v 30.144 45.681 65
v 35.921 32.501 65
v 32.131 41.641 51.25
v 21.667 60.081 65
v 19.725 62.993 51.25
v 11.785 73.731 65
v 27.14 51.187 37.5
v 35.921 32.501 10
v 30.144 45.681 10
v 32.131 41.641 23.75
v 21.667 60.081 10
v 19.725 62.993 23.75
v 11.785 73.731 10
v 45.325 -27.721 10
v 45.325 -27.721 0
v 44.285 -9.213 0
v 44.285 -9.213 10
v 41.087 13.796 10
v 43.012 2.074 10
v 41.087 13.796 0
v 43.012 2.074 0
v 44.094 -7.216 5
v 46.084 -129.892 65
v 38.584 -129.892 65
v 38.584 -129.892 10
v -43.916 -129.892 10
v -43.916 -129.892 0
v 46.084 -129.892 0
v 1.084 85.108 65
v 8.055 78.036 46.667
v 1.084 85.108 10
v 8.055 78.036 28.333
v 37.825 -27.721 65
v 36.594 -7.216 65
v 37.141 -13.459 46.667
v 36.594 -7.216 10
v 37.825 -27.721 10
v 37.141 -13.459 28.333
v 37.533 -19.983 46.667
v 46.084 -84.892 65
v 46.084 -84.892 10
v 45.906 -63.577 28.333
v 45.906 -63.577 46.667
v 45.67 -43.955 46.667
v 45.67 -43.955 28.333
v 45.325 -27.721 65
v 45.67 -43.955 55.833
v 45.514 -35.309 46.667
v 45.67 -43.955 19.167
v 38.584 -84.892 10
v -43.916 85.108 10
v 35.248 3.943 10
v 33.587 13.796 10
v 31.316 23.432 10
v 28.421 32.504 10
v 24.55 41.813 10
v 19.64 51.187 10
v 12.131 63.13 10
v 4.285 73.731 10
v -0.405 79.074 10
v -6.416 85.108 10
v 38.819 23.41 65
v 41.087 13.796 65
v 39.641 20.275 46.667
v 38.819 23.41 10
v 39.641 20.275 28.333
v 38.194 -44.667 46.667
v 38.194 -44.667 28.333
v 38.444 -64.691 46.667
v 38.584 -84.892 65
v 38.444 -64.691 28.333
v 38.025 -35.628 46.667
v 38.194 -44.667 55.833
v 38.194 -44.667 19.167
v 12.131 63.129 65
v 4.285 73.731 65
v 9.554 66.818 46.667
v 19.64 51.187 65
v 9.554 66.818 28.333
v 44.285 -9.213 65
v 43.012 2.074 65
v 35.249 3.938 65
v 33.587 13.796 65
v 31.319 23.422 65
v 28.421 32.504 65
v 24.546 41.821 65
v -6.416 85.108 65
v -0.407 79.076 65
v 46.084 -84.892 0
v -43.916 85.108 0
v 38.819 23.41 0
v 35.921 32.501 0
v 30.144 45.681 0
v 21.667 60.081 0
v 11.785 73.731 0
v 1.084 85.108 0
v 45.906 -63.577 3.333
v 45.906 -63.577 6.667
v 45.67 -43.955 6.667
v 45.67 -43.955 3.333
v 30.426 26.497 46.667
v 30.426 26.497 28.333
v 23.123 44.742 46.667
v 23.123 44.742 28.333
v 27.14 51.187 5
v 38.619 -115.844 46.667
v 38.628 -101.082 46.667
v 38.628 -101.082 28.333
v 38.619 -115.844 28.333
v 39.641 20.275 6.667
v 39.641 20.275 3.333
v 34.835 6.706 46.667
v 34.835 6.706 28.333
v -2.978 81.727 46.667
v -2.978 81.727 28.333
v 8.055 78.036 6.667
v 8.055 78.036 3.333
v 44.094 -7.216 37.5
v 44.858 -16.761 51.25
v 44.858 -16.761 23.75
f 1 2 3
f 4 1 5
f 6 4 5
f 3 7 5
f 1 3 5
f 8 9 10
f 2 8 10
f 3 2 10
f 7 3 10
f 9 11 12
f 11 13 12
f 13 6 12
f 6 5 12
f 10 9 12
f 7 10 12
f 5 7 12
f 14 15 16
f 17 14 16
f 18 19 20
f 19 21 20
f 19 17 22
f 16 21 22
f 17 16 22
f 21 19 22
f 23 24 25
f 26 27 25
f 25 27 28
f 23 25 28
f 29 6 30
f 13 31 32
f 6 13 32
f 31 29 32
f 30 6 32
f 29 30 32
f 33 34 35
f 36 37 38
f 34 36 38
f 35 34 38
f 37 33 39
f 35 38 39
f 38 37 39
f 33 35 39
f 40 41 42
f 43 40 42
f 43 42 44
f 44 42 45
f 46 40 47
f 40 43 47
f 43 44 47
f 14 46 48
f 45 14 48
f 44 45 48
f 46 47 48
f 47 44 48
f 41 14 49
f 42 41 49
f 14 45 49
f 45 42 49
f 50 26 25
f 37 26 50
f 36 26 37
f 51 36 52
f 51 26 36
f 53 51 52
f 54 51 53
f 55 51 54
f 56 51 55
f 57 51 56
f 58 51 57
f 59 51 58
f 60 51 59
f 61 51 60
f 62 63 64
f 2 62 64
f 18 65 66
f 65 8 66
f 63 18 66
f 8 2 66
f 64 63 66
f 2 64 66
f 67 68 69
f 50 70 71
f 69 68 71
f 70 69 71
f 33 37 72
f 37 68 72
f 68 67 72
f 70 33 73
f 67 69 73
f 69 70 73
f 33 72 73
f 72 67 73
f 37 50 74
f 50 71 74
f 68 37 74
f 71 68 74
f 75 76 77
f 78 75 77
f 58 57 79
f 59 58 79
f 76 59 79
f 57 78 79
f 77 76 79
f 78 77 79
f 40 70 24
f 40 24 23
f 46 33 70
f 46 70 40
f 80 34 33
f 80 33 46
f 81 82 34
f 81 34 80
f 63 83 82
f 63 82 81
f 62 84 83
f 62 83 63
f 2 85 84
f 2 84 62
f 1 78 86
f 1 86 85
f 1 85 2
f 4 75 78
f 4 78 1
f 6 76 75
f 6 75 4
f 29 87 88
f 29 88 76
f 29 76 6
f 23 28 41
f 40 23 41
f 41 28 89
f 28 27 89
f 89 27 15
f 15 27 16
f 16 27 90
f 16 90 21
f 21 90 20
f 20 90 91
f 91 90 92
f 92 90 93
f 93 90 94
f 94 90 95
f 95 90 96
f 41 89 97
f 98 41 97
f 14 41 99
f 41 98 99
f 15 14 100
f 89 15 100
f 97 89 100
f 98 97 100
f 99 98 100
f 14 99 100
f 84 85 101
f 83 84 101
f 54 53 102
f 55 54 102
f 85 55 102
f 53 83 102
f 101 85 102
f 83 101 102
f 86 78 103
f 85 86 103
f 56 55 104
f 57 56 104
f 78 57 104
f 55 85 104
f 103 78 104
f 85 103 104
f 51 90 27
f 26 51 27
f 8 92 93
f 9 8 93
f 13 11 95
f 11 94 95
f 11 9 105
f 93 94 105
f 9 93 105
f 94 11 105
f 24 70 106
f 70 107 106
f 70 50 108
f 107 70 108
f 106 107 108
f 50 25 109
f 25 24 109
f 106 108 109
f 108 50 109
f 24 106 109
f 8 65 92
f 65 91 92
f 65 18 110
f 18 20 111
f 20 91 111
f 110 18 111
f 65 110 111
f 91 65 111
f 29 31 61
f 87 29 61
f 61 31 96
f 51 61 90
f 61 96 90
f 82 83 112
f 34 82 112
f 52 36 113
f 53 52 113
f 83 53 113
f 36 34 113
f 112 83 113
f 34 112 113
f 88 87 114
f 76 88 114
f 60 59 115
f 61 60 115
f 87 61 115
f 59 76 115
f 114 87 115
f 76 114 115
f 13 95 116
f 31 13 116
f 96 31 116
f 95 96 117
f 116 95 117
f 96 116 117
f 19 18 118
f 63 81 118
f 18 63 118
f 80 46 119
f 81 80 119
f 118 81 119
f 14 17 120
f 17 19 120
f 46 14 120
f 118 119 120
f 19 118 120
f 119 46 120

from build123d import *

# Parameters (mm, degrees)
F1_DEPTH = 10
F2_DEPTH = 10
F3_DEPTH = 65


with BuildPart() as f1:
    # F0 (on Top) → F1 (new body)
    with BuildSketch(Plane.XY):
        with BuildLine():
            Line((-6.4156497025, 85.1081629097), (-43.9156497025, 85.1081629097))
            Line((-43.9156497025, 85.1081629097), (-43.9156497025, -129.8918370903))
            Line((-43.9156497025, -129.8918370903), (38.5843502975, -129.8918370903))
            add(Edge.make_bspline(
                [(38.5843502975, -84.8918370903), (38.6629251975, -102.0344655935), (38.6236377475, -115.9631513419), (38.5843502975, -129.8918370903)],
                knots=[0.8384847001, 0.8384847001, 0.8384847001, 0.8384847001, 1, 1, 1, 1], degree=3))
            add(Edge.make_bspline(
                [(37.8247797489, -27.7212038636), (38.2574592427, -42.1620939878), (38.4957809909, -65.568736192), (38.5843502975, -84.8918370903)],
                knots=[0.656425313, 0.656425313, 0.656425313, 0.656425313, 0.8384847001, 0.8384847001, 0.8384847001, 0.8384847001], degree=3))
            add(Edge.make_bspline(
                [(36.5943424404, -7.2156004608), (37.2362484349, -13.6305807929), (37.5654292116, -19.0652525968), (37.8247797489, -27.7212038636)],
                knots=[0.5472978861, 0.5472978861, 0.5472978861, 0.5472978861, 0.656425313, 0.656425313, 0.656425313, 0.656425313], degree=3))
            add(Edge.make_bspline(
                [(33.5867255926, 13.7964012101), (34.9662089288, 6.8390445181), (35.9418422096, -0.6947450977), (36.5943424404, -7.2156004608)],
                knots=[0.4363693828, 0.4363693828, 0.4363693828, 0.4363693828, 0.5472978861, 0.5472978861, 0.5472978861, 0.5472978861], degree=3))
            add(Edge.make_bspline(
                [(28.4207668155, 32.5041674078), (30.5793144703, 26.5747507113), (32.2676481423, 20.4491037734), (33.5867255926, 13.7964012101)],
                knots=[0.3302983028, 0.3302983028, 0.3302983028, 0.3302983028, 0.4363693828, 0.4363693828, 0.4363693828, 0.4363693828], degree=3))
            add(Edge.make_bspline(
                [(19.6397788823, 51.1871948838), (23.4681991426, 44.5259897561), (26.1945597605, 38.6194409127), (28.4207668155, 32.5041674078)],
                knots=[0.2209024383, 0.2209024383, 0.2209024383, 0.2209024383, 0.3302983028, 0.3302983028, 0.3302983028, 0.3302983028], degree=3))
            add(Edge.make_bspline(
                [(4.2853341438, 73.7309530377), (9.3823617053, 67.4979864081), (15.2391329379, 58.8440359139), (19.6397788823, 51.1871948838)],
                knots=[0.0951554109, 0.0951554109, 0.0951554109, 0.0951554109, 0.2209024383, 0.2209024383, 0.2209024383, 0.2209024383], degree=3))
            add(Edge.make_bspline(
                [(-6.4156497025, 85.1081629097), (-2.9936715674, 81.7778662113), (0.4283065678, 78.4475695129), (4.2853341438, 73.7309530377)],
                knots=[0, 0, 0, 0, 0.0951554109, 0.0951554109, 0.0951554109, 0.0951554109], degree=3))
        make_face()
    extrude(amount=F1_DEPTH)

    # F0 (on Top) → F2 (join)
    with BuildSketch(Plane.XY):
        with BuildLine():
            Line((-6.4156497025, 85.1081629097), (-43.9156497025, 85.1081629097))
            Line((-43.9156497025, 85.1081629097), (-43.9156497025, -129.8918370903))
            Line((-43.9156497025, -129.8918370903), (38.5843502975, -129.8918370903))
            add(Edge.make_bspline(
                [(38.5843502975, -84.8918370903), (38.6629251975, -102.0344655935), (38.6236377475, -115.9631513419), (38.5843502975, -129.8918370903)],
                knots=[0.8384847001, 0.8384847001, 0.8384847001, 0.8384847001, 1, 1, 1, 1], degree=3))
            add(Edge.make_bspline(
                [(37.8247797489, -27.7212038636), (38.2574592427, -42.1620939878), (38.4957809909, -65.568736192), (38.5843502975, -84.8918370903)],
                knots=[0.656425313, 0.656425313, 0.656425313, 0.656425313, 0.8384847001, 0.8384847001, 0.8384847001, 0.8384847001], degree=3))
            add(Edge.make_bspline(
                [(36.5943424404, -7.2156004608), (37.2362484349, -13.6305807929), (37.5654292116, -19.0652525968), (37.8247797489, -27.7212038636)],
                knots=[0.5472978861, 0.5472978861, 0.5472978861, 0.5472978861, 0.656425313, 0.656425313, 0.656425313, 0.656425313], degree=3))
            add(Edge.make_bspline(
                [(33.5867255926, 13.7964012101), (34.9662089288, 6.8390445181), (35.9418422096, -0.6947450977), (36.5943424404, -7.2156004608)],
                knots=[0.4363693828, 0.4363693828, 0.4363693828, 0.4363693828, 0.5472978861, 0.5472978861, 0.5472978861, 0.5472978861], degree=3))
            add(Edge.make_bspline(
                [(28.4207668155, 32.5041674078), (30.5793144703, 26.5747507113), (32.2676481423, 20.4491037734), (33.5867255926, 13.7964012101)],
                knots=[0.3302983028, 0.3302983028, 0.3302983028, 0.3302983028, 0.4363693828, 0.4363693828, 0.4363693828, 0.4363693828], degree=3))
            add(Edge.make_bspline(
                [(19.6397788823, 51.1871948838), (23.4681991426, 44.5259897561), (26.1945597605, 38.6194409127), (28.4207668155, 32.5041674078)],
                knots=[0.2209024383, 0.2209024383, 0.2209024383, 0.2209024383, 0.3302983028, 0.3302983028, 0.3302983028, 0.3302983028], degree=3))
            add(Edge.make_bspline(
                [(4.2853341438, 73.7309530377), (9.3823617053, 67.4979864081), (15.2391329379, 58.8440359139), (19.6397788823, 51.1871948838)],
                knots=[0.0951554109, 0.0951554109, 0.0951554109, 0.0951554109, 0.2209024383, 0.2209024383, 0.2209024383, 0.2209024383], degree=3))
            add(Edge.make_bspline(
                [(-6.4156497025, 85.1081629097), (-2.9936715674, 81.7778662113), (0.4283065678, 78.4475695129), (4.2853341438, 73.7309530377)],
                knots=[0, 0, 0, 0, 0.0951554109, 0.0951554109, 0.0951554109, 0.0951554109], degree=3))
        make_face()
        with BuildLine():
            Line((1.0843502975, 85.1081629097), (-6.4156497025, 85.1081629097))
            add(Edge.make_bspline(
                [(-6.4156497025, 85.1081629097), (-2.9936715674, 81.7778662113), (0.4283065678, 78.4475695129), (4.2853341438, 73.7309530377)],
                knots=[0, 0, 0, 0, 0.0951554109, 0.0951554109, 0.0951554109, 0.0951554109], degree=3))
            Line((4.2853341438, 73.7309530377), (11.7853341438, 73.7309530377))
            add(Edge.make_bspline(
                [(11.7853341438, 73.7309530377), (7.9263211871, 78.4469803122), (4.4998545709, 81.7753394458), (1.0843502975, 85.1081629097)],
                knots=[0.8865149152, 0.8865149152, 0.8865149152, 0.8865149152, 1, 1, 1, 1], degree=3))
        make_face()
        with BuildLine():
            Line((11.7853341438, 73.7309530377), (4.2853341438, 73.7309530377))
            add(Edge.make_bspline(
                [(4.2853341438, 73.7309530377), (9.3823617053, 67.4979864081), (15.2391329379, 58.8440359139), (19.6397788823, 51.1871948838)],
                knots=[0.0951554109, 0.0951554109, 0.0951554109, 0.0951554109, 0.2209024383, 0.2209024383, 0.2209024383, 0.2209024383], degree=3))
            Line((19.6397788823, 51.1871948838), (27.1397788823, 51.1871948838))
            add(Edge.make_bspline(
                [(27.1397788823, 51.1871948838), (22.7400090025, 58.8432384602), (16.8849853681, 67.4987650316), (11.7853341438, 73.7309530377)],
                knots=[0.7365453872, 0.7365453872, 0.7365453872, 0.7365453872, 0.8865149152, 0.8865149152, 0.8865149152, 0.8865149152], degree=3))
        make_face()
        with BuildLine():
            Line((27.1397788823, 51.1871948838), (19.6397788823, 51.1871948838))
            add(Edge.make_bspline(
                [(19.6397788823, 51.1871948838), (23.4681991426, 44.5259897561), (26.1945597605, 38.6194409127), (28.4207668155, 32.5041674078)],
                knots=[0.2209024383, 0.2209024383, 0.2209024383, 0.2209024383, 0.3302983028, 0.3302983028, 0.3302983028, 0.3302983028], degree=3))
            Line((28.4207668155, 32.5041674078), (35.9207659553, 32.5005751986))
            add(Edge.make_bspline(
                [(35.9207659553, 32.5005751986), (33.6941243555, 38.6216951614), (30.9677383505, 44.5261591256), (27.1397788823, 51.1871948838)],
                knots=[0.6060664552, 0.6060664552, 0.6060664552, 0.6060664552, 0.7365453872, 0.7365453872, 0.7365453872, 0.7365453872], degree=3))
        make_face()
        with BuildLine():
            Line((35.9207659553, 32.5005751986), (28.4207668155, 32.5041674078))
            add(Edge.make_bspline(
                [(28.4207668155, 32.5041674078), (30.5793144703, 26.5747507113), (32.2676481423, 20.4491037734), (33.5867255926, 13.7964012101)],
                knots=[0.3302983028, 0.3302983028, 0.3302983028, 0.3302983028, 0.4363693828, 0.4363693828, 0.4363693828, 0.4363693828], degree=3))
            Line((33.5867255926, 13.7964012101), (41.0867255926, 13.7964012101))
            add(Edge.make_bspline(
                [(41.0867255926, 13.7964012101), (39.7683073236, 20.4287791205), (38.0793724104, 26.5664863603), (35.9207659553, 32.5005751986)],
                knots=[0.4795743136, 0.4795743136, 0.4795743136, 0.4795743136, 0.6060664552, 0.6060664552, 0.6060664552, 0.6060664552], degree=3))
        make_face()
        with BuildLine():
            Line((41.0867255926, 13.7964012101), (33.5867255926, 13.7964012101))
            add(Edge.make_bspline(
                [(33.5867255926, 13.7964012101), (34.9662089288, 6.8390445181), (35.9418422096, -0.6947450977), (36.5943424404, -7.2156004608)],
                knots=[0.4363693828, 0.4363693828, 0.4363693828, 0.4363693828, 0.5472978861, 0.5472978861, 0.5472978861, 0.5472978861], degree=3))
            Line((36.5943424404, -7.2156004608), (44.0943424404, -7.2156004608))
            add(Edge.make_bspline(
                [(44.0943424404, -7.2156004608), (43.4392586722, -0.6181494471), (42.4656425654, 6.8596811378), (41.0867255926, 13.7964012101)],
                knots=[0.3472777843, 0.3472777843, 0.3472777843, 0.3472777843, 0.4795743136, 0.4795743136, 0.4795743136, 0.4795743136], degree=3))
        make_face()
        with BuildLine():
            add(Edge.make_bspline(
                [(36.5943424404, -7.2156004608), (37.2362484349, -13.6305807929), (37.5654292116, -19.0652525968), (37.8247797489, -27.7212038636)],
                knots=[0.5472978861, 0.5472978861, 0.5472978861, 0.5472978861, 0.656425313, 0.656425313, 0.656425313, 0.656425313], degree=3))
            Line((37.8247797489, -27.7212038636), (45.3247797489, -27.7212038636))
            add(Edge.make_bspline(
                [(45.3247797489, -27.7212038636), (45.0749649187, -19.3442418385), (44.7387900251, -13.7059328081), (44.0943424404, -7.2156004608)],
                knots=[0.2171292707, 0.2171292707, 0.2171292707, 0.2171292707, 0.3472777843, 0.3472777843, 0.3472777843, 0.3472777843], degree=3))
            Line((44.0943424404, -7.2156004608), (36.5943424404, -7.2156004608))
        make_face()
        with BuildLine():
            add(Edge.make_bspline(
                [(37.8247797489, -27.7212038636), (38.2574592427, -42.1620939878), (38.4957809909, -65.568736192), (38.5843502975, -84.8918370903)],
                knots=[0.656425313, 0.656425313, 0.656425313, 0.656425313, 0.8384847001, 0.8384847001, 0.8384847001, 0.8384847001], degree=3))
            Line((38.5843502975, -84.8918370903), (46.0843502975, -84.8918370903))
            add(Edge.make_bspline(
                [(46.0843502975, -84.8918370903), (45.9179565044, -63.2945609487), (45.7415506391, -41.6966508653), (45.3247797489, -27.7212038636)],
                knots=[0, 0, 0, 0, 0.2171292707, 0.2171292707, 0.2171292707, 0.2171292707], degree=3))
            Line((45.3247797489, -27.7212038636), (37.8247797489, -27.7212038636))
        make_face()
    extrude(amount=F2_DEPTH)

    # F0 (on Top) → F3 (join)
    with BuildSketch(Plane.XY):
        with BuildLine():
            add(Edge.make_bspline(
                [(38.5843502975, -84.8918370903), (38.6629251975, -102.0344655935), (38.6236377475, -115.9631513419), (38.5843502975, -129.8918370903)],
                knots=[0.8384847001, 0.8384847001, 0.8384847001, 0.8384847001, 1, 1, 1, 1], degree=3))
            Line((38.5843502975, -129.8918370903), (46.0843502975, -129.8918370903))
            Line((46.0843502975, -129.8918370903), (46.0843502975, -84.8918370903))
            Line((46.0843502975, -84.8918370903), (38.5843502975, -84.8918370903))
        make_face()
        with BuildLine():
            add(Edge.make_bspline(
                [(37.8247797489, -27.7212038636), (38.2574592427, -42.1620939878), (38.4957809909, -65.568736192), (38.5843502975, -84.8918370903)],
                knots=[0.656425313, 0.656425313, 0.656425313, 0.656425313, 0.8384847001, 0.8384847001, 0.8384847001, 0.8384847001], degree=3))
            Line((38.5843502975, -84.8918370903), (46.0843502975, -84.8918370903))
            add(Edge.make_bspline(
                [(46.0843502975, -84.8918370903), (45.9179565044, -63.2945609487), (45.7415506391, -41.6966508653), (45.3247797489, -27.7212038636)],
                knots=[0, 0, 0, 0, 0.2171292707, 0.2171292707, 0.2171292707, 0.2171292707], degree=3))
            Line((45.3247797489, -27.7212038636), (37.8247797489, -27.7212038636))
        make_face()
        with BuildLine():
            add(Edge.make_bspline(
                [(36.5943424404, -7.2156004608), (37.2362484349, -13.6305807929), (37.5654292116, -19.0652525968), (37.8247797489, -27.7212038636)],
                knots=[0.5472978861, 0.5472978861, 0.5472978861, 0.5472978861, 0.656425313, 0.656425313, 0.656425313, 0.656425313], degree=3))
            Line((37.8247797489, -27.7212038636), (45.3247797489, -27.7212038636))
            add(Edge.make_bspline(
                [(45.3247797489, -27.7212038636), (45.0749649187, -19.3442418385), (44.7387900251, -13.7059328081), (44.0943424404, -7.2156004608)],
                knots=[0.2171292707, 0.2171292707, 0.2171292707, 0.2171292707, 0.3472777843, 0.3472777843, 0.3472777843, 0.3472777843], degree=3))
            Line((44.0943424404, -7.2156004608), (36.5943424404, -7.2156004608))
        make_face()
        with BuildLine():
            Line((41.0867255926, 13.7964012101), (33.5867255926, 13.7964012101))
            add(Edge.make_bspline(
                [(33.5867255926, 13.7964012101), (34.9662089288, 6.8390445181), (35.9418422096, -0.6947450977), (36.5943424404, -7.2156004608)],
                knots=[0.4363693828, 0.4363693828, 0.4363693828, 0.4363693828, 0.5472978861, 0.5472978861, 0.5472978861, 0.5472978861], degree=3))
            Line((36.5943424404, -7.2156004608), (44.0943424404, -7.2156004608))
            add(Edge.make_bspline(
                [(44.0943424404, -7.2156004608), (43.4392586722, -0.6181494471), (42.4656425654, 6.8596811378), (41.0867255926, 13.7964012101)],
                knots=[0.3472777843, 0.3472777843, 0.3472777843, 0.3472777843, 0.4795743136, 0.4795743136, 0.4795743136, 0.4795743136], degree=3))
        make_face()
        with BuildLine():
            Line((35.9207659553, 32.5005751986), (28.4207668155, 32.5041674078))
            add(Edge.make_bspline(
                [(28.4207668155, 32.5041674078), (30.5793144703, 26.5747507113), (32.2676481423, 20.4491037734), (33.5867255926, 13.7964012101)],
                knots=[0.3302983028, 0.3302983028, 0.3302983028, 0.3302983028, 0.4363693828, 0.4363693828, 0.4363693828, 0.4363693828], degree=3))
            Line((33.5867255926, 13.7964012101), (41.0867255926, 13.7964012101))
            add(Edge.make_bspline(
                [(41.0867255926, 13.7964012101), (39.7683073236, 20.4287791205), (38.0793724104, 26.5664863603), (35.9207659553, 32.5005751986)],
                knots=[0.4795743136, 0.4795743136, 0.4795743136, 0.4795743136, 0.6060664552, 0.6060664552, 0.6060664552, 0.6060664552], degree=3))
        make_face()
        with BuildLine():
            Line((27.1397788823, 51.1871948838), (19.6397788823, 51.1871948838))
            add(Edge.make_bspline(
                [(19.6397788823, 51.1871948838), (23.4681991426, 44.5259897561), (26.1945597605, 38.6194409127), (28.4207668155, 32.5041674078)],
                knots=[0.2209024383, 0.2209024383, 0.2209024383, 0.2209024383, 0.3302983028, 0.3302983028, 0.3302983028, 0.3302983028], degree=3))
            Line((28.4207668155, 32.5041674078), (35.9207659553, 32.5005751986))
            add(Edge.make_bspline(
                [(35.9207659553, 32.5005751986), (33.6941243555, 38.6216951614), (30.9677383505, 44.5261591256), (27.1397788823, 51.1871948838)],
                knots=[0.6060664552, 0.6060664552, 0.6060664552, 0.6060664552, 0.7365453872, 0.7365453872, 0.7365453872, 0.7365453872], degree=3))
        make_face()
        with BuildLine():
            Line((1.0843502975, 85.1081629097), (-6.4156497025, 85.1081629097))
            add(Edge.make_bspline(
                [(-6.4156497025, 85.1081629097), (-2.9936715674, 81.7778662113), (0.4283065678, 78.4475695129), (4.2853341438, 73.7309530377)],
                knots=[0, 0, 0, 0, 0.0951554109, 0.0951554109, 0.0951554109, 0.0951554109], degree=3))
            Line((4.2853341438, 73.7309530377), (11.7853341438, 73.7309530377))
            add(Edge.make_bspline(
                [(11.7853341438, 73.7309530377), (7.9263211871, 78.4469803122), (4.4998545709, 81.7753394458), (1.0843502975, 85.1081629097)],
                knots=[0.8865149152, 0.8865149152, 0.8865149152, 0.8865149152, 1, 1, 1, 1], degree=3))
        make_face()
        with BuildLine():
            Line((11.7853341438, 73.7309530377), (4.2853341438, 73.7309530377))
            add(Edge.make_bspline(
                [(4.2853341438, 73.7309530377), (9.3823617053, 67.4979864081), (15.2391329379, 58.8440359139), (19.6397788823, 51.1871948838)],
                knots=[0.0951554109, 0.0951554109, 0.0951554109, 0.0951554109, 0.2209024383, 0.2209024383, 0.2209024383, 0.2209024383], degree=3))
            Line((19.6397788823, 51.1871948838), (27.1397788823, 51.1871948838))
            add(Edge.make_bspline(
                [(27.1397788823, 51.1871948838), (22.7400090025, 58.8432384602), (16.8849853681, 67.4987650316), (11.7853341438, 73.7309530377)],
                knots=[0.7365453872, 0.7365453872, 0.7365453872, 0.7365453872, 0.8865149152, 0.8865149152, 0.8865149152, 0.8865149152], degree=3))
        make_face()
    extrude(amount=F3_DEPTH)


solid = f1.part
